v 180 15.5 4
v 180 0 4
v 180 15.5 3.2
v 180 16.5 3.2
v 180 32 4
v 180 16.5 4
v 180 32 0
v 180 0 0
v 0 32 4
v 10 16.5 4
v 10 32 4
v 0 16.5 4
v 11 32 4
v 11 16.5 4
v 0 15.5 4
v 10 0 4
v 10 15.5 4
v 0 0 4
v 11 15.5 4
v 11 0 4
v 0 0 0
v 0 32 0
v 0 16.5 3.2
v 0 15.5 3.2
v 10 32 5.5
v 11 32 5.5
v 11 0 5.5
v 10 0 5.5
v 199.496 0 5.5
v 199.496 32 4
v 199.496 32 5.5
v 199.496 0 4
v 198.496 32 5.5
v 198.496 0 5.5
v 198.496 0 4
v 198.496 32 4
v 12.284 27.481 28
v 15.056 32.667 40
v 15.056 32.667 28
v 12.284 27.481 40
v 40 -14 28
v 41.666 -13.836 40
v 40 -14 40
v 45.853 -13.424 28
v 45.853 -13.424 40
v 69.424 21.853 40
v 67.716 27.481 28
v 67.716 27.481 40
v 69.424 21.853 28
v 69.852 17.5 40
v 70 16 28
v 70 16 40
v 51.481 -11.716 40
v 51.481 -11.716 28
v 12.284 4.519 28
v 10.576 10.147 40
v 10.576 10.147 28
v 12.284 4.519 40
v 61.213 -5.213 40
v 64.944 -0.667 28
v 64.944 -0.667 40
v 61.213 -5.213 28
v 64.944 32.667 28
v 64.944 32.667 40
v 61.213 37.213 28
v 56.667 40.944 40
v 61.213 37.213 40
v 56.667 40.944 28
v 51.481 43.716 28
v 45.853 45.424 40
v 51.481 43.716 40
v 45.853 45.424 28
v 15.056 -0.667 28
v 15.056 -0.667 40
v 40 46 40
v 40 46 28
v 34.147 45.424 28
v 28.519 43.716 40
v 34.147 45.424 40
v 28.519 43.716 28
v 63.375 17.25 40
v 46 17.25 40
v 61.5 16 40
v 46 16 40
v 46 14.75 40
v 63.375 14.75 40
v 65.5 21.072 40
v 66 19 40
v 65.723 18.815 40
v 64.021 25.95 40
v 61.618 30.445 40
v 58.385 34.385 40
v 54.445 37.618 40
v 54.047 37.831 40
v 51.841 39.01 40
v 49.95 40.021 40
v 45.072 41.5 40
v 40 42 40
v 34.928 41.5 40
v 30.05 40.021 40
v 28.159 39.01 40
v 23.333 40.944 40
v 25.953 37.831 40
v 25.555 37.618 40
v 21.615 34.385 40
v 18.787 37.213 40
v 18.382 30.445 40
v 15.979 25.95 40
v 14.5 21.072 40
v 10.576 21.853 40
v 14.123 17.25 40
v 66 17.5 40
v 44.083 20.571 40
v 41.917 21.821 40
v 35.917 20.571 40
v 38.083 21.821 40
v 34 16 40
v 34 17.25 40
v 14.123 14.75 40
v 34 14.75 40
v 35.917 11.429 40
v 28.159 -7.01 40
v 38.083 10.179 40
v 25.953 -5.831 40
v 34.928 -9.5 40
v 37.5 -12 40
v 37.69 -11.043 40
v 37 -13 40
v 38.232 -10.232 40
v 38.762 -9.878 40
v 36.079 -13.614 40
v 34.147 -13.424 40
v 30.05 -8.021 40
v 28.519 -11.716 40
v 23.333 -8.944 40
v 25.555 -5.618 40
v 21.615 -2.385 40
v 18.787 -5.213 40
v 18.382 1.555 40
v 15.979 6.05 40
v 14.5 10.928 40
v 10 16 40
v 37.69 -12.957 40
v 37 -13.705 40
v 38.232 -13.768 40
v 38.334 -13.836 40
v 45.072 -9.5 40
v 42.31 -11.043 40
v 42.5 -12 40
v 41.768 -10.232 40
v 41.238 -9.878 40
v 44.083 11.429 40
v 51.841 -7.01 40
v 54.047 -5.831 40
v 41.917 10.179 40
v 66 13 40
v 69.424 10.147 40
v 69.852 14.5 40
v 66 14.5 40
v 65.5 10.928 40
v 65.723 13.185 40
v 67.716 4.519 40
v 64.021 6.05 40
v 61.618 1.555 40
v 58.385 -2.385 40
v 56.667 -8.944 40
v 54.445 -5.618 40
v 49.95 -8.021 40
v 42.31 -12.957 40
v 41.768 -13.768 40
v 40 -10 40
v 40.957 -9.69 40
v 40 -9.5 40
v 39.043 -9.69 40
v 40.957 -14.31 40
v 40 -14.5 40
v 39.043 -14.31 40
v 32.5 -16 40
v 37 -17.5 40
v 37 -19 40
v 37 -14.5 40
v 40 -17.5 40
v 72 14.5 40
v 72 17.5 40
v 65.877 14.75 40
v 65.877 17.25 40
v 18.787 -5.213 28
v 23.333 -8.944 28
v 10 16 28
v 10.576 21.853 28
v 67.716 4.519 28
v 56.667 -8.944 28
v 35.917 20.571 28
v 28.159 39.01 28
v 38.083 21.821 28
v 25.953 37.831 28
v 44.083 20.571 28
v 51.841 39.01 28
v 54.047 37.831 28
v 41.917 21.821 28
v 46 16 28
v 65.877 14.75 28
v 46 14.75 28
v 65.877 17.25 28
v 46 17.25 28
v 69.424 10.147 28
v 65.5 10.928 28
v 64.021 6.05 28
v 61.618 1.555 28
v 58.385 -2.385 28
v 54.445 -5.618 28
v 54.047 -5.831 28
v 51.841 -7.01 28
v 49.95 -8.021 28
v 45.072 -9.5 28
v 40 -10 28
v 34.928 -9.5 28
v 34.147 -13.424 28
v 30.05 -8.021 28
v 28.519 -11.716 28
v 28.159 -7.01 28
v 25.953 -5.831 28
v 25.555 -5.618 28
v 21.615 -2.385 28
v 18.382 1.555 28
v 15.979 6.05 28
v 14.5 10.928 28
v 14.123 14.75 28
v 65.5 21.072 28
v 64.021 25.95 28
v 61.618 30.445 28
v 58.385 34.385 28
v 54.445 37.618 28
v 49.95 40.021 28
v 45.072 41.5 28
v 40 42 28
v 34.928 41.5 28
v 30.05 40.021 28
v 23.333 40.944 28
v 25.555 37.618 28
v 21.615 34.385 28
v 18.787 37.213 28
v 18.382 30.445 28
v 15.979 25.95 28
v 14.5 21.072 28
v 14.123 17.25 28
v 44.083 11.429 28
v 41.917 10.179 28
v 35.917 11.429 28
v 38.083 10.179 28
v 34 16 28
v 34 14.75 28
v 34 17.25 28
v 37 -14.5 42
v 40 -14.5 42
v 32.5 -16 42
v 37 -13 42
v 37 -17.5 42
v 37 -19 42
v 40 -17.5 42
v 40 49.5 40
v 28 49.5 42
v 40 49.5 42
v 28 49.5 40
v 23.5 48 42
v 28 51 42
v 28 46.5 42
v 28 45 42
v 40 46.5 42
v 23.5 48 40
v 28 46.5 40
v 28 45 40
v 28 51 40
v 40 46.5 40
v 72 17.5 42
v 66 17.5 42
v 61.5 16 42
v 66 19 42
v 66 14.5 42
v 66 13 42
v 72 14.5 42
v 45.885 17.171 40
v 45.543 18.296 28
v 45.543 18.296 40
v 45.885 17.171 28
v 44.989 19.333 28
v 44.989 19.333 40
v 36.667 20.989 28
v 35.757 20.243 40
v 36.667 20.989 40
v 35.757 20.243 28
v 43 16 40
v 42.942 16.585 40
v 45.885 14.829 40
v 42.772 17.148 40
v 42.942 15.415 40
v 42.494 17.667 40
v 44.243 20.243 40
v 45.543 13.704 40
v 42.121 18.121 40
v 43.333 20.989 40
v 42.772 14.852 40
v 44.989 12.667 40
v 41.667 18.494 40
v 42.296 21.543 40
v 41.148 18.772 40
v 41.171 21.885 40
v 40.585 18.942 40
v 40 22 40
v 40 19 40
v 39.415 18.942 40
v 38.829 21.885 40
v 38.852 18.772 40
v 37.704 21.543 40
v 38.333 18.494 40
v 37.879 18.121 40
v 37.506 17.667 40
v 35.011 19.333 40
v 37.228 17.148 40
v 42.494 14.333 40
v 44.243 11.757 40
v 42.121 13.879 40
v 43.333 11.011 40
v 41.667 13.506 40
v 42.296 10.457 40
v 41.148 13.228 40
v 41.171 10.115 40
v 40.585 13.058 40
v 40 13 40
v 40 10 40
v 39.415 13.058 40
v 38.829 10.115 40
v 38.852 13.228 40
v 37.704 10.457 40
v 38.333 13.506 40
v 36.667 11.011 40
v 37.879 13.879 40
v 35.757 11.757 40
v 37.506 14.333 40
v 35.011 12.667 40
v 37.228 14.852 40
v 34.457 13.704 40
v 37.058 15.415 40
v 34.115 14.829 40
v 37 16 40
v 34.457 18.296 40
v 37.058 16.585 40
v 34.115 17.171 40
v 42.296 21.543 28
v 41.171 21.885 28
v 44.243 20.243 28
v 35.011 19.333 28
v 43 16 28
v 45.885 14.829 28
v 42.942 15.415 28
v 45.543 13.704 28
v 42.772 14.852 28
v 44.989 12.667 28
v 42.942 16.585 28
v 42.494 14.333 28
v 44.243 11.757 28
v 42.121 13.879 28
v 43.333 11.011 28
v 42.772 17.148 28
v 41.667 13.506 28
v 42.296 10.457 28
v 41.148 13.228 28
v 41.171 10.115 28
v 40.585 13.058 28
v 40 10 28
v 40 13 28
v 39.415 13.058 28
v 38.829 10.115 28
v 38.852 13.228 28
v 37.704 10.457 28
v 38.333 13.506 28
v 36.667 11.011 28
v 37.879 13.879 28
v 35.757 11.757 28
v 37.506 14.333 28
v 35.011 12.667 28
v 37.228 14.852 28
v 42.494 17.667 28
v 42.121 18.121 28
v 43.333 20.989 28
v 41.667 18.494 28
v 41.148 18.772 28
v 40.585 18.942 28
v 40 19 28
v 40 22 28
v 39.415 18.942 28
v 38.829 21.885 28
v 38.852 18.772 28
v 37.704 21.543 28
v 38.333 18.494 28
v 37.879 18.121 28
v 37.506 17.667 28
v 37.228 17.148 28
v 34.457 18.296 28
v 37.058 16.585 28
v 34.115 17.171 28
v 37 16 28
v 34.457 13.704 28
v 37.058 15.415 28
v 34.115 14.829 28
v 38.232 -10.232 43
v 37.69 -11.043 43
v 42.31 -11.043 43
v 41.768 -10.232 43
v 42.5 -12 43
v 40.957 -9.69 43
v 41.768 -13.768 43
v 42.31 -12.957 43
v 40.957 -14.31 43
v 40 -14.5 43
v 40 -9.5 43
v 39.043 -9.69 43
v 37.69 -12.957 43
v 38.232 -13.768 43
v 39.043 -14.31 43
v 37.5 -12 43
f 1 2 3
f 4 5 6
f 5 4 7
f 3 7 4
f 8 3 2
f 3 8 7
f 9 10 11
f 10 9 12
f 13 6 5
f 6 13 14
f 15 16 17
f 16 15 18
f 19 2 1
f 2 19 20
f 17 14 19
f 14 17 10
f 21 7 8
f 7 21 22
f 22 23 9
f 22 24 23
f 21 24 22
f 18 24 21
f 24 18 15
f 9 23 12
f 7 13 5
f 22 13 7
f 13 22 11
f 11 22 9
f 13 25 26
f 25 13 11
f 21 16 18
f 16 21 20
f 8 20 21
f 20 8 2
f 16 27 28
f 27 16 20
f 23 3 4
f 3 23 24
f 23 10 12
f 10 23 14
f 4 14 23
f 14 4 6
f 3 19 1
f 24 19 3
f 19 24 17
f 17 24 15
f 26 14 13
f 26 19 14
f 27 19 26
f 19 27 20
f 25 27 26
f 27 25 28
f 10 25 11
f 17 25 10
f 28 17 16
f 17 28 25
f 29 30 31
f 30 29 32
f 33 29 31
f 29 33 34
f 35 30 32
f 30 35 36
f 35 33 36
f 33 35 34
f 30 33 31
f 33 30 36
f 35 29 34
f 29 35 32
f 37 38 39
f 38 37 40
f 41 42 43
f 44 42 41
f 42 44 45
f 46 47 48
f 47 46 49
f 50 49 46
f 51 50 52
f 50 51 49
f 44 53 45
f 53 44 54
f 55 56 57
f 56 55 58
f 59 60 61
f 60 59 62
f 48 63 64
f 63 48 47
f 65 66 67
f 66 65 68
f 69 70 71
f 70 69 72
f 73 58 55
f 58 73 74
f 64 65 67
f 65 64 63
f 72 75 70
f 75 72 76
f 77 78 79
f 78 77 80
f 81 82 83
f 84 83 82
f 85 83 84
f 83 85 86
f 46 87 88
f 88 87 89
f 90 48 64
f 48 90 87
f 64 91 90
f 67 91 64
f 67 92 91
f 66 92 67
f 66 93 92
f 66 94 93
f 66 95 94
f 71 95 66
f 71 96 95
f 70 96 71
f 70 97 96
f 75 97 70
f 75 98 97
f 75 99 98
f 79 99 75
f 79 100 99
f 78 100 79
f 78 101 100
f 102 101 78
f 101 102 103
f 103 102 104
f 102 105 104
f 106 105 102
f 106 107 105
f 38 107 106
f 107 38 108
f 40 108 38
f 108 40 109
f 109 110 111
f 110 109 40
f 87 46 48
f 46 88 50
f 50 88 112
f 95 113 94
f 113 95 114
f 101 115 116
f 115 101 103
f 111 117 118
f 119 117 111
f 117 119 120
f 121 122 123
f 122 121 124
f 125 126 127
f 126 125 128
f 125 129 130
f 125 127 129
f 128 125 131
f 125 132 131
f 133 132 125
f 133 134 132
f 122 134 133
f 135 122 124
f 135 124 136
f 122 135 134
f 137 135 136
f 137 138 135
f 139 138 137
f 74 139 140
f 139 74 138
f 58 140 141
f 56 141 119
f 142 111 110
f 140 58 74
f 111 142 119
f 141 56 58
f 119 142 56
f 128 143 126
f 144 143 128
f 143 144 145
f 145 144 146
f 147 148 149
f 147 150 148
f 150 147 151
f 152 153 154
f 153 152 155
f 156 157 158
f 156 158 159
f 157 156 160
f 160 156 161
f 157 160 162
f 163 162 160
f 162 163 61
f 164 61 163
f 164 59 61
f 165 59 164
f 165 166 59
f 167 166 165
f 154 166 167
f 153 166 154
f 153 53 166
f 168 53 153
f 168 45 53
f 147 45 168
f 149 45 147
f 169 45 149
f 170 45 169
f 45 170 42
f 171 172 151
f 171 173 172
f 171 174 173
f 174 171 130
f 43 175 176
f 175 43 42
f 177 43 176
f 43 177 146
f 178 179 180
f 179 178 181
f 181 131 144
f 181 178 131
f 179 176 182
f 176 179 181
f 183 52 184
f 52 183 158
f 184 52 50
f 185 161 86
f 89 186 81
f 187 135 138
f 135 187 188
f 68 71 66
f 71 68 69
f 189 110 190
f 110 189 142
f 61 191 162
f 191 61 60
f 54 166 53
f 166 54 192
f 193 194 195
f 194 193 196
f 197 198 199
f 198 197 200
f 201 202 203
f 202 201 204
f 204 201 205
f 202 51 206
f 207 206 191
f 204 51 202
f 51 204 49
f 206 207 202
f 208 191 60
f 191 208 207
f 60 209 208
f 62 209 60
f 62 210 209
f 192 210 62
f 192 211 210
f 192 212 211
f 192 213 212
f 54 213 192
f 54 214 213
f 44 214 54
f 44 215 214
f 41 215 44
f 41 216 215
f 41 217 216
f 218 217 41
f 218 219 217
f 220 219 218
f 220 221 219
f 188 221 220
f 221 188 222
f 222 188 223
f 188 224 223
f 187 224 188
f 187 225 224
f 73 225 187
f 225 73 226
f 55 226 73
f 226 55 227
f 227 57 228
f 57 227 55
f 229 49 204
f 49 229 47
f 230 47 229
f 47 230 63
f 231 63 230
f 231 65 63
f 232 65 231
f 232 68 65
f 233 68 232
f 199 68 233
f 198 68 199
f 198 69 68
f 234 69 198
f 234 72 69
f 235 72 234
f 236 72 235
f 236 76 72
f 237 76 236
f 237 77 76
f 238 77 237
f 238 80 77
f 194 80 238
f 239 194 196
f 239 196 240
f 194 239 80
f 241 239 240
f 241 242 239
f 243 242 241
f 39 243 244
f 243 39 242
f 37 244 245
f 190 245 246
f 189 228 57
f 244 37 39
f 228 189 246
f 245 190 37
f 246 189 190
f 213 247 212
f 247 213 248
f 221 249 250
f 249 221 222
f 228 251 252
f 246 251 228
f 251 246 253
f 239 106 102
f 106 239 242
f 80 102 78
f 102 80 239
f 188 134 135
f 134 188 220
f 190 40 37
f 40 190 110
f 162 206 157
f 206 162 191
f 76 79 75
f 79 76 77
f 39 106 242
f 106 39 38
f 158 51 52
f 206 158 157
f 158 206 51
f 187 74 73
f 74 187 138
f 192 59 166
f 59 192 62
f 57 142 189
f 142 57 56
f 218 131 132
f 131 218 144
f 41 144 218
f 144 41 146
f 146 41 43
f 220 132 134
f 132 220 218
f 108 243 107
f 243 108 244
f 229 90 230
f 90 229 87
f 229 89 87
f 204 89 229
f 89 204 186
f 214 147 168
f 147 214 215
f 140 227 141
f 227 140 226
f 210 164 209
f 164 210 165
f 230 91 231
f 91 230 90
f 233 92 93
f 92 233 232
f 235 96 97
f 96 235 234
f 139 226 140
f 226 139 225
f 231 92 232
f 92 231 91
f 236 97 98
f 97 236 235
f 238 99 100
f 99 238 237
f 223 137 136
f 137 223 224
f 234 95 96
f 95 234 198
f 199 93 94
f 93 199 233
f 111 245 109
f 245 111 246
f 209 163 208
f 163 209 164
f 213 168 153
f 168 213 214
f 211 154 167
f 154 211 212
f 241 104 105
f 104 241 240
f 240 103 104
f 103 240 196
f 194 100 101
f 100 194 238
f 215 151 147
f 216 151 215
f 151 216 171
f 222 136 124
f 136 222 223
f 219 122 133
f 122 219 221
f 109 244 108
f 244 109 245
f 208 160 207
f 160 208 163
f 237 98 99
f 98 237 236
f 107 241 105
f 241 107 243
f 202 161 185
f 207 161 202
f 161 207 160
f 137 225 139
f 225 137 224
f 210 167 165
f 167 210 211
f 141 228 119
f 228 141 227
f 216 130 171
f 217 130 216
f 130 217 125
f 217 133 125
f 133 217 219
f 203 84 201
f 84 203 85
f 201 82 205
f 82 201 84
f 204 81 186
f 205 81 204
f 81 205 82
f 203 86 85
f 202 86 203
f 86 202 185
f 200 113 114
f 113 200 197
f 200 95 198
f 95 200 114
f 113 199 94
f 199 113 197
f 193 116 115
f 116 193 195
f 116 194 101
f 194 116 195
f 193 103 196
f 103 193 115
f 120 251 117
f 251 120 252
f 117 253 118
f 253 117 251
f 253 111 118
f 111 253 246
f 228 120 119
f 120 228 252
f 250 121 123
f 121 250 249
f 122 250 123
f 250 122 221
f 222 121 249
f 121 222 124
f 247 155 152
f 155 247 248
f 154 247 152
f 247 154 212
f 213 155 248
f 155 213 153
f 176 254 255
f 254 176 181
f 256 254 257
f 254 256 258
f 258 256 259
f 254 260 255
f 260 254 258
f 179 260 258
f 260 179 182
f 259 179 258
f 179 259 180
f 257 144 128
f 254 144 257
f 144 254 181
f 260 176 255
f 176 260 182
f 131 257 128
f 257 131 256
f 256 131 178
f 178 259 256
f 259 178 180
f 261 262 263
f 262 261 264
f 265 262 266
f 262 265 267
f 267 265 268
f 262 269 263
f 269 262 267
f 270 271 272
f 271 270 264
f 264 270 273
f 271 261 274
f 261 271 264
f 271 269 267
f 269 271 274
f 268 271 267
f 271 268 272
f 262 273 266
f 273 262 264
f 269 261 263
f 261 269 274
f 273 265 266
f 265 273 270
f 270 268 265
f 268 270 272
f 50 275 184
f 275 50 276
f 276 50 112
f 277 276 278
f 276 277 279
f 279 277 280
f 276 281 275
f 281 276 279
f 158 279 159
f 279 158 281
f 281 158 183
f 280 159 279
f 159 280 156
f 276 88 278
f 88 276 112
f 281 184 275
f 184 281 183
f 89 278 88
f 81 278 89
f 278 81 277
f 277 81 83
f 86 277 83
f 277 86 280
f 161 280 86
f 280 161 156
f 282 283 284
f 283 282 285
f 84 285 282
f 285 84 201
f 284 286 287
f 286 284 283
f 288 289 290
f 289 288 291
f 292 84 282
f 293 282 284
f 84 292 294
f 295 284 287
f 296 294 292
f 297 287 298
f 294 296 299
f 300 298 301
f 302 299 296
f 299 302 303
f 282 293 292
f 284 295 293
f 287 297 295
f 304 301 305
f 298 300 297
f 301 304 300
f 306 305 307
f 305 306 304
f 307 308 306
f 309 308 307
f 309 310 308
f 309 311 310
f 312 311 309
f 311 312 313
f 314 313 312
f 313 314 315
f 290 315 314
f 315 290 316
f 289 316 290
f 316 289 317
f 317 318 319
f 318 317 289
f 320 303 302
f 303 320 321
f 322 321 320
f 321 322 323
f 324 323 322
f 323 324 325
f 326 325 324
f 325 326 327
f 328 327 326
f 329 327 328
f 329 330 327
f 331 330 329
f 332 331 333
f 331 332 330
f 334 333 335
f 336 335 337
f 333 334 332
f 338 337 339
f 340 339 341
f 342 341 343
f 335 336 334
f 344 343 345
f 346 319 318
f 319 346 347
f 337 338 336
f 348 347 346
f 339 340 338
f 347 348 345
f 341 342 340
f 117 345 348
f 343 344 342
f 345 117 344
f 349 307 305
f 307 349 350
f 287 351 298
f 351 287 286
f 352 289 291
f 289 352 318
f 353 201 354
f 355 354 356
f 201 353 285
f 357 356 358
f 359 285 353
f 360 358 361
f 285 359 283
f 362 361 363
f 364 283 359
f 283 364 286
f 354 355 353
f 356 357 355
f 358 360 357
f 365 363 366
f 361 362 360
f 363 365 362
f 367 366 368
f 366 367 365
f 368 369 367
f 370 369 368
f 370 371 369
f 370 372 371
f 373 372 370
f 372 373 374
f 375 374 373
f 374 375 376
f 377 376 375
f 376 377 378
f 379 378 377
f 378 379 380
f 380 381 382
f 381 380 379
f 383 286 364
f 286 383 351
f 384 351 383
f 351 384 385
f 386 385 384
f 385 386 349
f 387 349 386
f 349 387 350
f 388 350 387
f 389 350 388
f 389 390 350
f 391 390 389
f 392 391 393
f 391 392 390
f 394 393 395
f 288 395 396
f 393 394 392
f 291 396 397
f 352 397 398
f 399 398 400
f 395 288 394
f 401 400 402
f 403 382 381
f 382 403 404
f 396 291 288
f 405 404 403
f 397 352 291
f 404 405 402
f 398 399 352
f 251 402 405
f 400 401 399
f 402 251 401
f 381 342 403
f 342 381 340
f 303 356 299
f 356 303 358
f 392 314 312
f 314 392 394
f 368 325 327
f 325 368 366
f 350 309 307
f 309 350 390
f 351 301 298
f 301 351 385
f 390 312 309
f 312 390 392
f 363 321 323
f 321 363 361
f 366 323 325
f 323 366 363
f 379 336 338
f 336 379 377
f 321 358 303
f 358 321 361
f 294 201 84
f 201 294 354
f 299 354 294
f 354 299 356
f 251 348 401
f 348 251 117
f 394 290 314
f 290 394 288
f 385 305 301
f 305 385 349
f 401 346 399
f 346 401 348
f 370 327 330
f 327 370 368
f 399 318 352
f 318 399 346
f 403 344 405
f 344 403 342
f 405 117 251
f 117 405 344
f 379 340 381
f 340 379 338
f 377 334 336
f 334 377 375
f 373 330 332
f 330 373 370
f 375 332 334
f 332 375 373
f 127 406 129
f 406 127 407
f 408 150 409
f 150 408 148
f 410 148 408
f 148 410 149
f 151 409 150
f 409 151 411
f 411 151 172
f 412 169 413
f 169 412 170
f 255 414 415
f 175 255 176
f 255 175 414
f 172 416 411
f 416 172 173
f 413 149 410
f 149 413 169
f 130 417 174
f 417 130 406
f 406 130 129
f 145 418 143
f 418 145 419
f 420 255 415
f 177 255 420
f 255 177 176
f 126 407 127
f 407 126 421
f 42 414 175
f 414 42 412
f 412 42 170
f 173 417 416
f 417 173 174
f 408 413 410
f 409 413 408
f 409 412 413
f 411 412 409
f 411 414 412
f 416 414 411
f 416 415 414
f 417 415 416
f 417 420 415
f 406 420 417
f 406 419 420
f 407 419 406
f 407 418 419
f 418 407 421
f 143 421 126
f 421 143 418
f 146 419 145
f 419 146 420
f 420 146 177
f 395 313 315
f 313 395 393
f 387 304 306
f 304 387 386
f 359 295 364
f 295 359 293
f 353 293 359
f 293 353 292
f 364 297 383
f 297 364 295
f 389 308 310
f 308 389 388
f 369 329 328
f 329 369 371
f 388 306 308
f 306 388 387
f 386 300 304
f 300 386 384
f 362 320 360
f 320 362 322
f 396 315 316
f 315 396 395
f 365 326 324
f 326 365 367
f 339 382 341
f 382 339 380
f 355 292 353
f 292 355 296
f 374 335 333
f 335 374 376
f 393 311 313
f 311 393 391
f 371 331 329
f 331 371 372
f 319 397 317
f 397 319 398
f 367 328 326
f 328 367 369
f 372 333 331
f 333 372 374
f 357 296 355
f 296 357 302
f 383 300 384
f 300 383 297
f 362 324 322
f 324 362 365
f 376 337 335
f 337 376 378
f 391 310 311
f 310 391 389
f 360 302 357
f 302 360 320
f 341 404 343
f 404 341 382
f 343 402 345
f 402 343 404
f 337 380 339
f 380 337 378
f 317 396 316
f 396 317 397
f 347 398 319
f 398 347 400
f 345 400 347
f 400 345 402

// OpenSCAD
/*
 * Title: Rolling Wheel Set
 * Folder: 13_rolling_motion
 * Physics Topic: Rolling Without Slipping, Cycloid Motion, Rolling Kinematics
 * Difficulty: Intermediate
 * Print Type: flat/freestanding
 * Teaches: v_contact=0, v_top=2v, cycloid rim path, rolling kinematics v=ωR
 * Use Case: Place wheel on surface, roll one revolution, observe contact point and velocity arrows
 */

// --------------------
// Parameters
// --------------------
wheel_diameter          = 60;   // mm — main wheel outer diameter
wheel_thickness         = 12;   // mm — wheel depth (axle direction)
hub_diameter            = 12;   // mm — central hub diameter
spoke_count             = 6;    // number of spokes
show_contact_mark       = true; // raised notch at rim showing instantaneous contact point
show_velocity_arrows    = true; // arrows: v=0 at bottom, v=2v at top
rolling_surface_width   = 180;  // mm — length of the flat rolling surface board
rolling_surface_thickness = 4;  // mm — thickness of rolling surface board

// --------------------
// Physics Meaning
// --------------------
// Rolling without slipping means the contact point velocity is zero.
// v_contact = v_cm - ω·R = 0  →  v_cm = ω·R
// The top of the wheel moves at v_top = v_cm + ω·R = 2·v_cm
// A point on the rim traces a CYCLOID as the wheel rolls.
// One full revolution moves the center by exactly 2π·R = π·d.

// --------------------
// Learning Notes
// --------------------
// - Spokes make rotation visually obvious when rolling
// - The rim notch (contact mark) shows the cycloid tracing point
// - Solid disk, spoked wheel, and ring have same mass but different moments of inertia
// - I_solid = (1/2)mR²,  I_ring = mR²,  I_spoked ≈ between these two

// --------------------
// Print Notes
// --------------------
// - Print wheel flat (face down); spokes bridge cleanly at 0.2 mm layers
// - Rolling surface prints flat; no supports needed
// - Use 20% infill for the wheel body
// - Increase $fn for smoother wheels if needed

// --------------------
// Customization Ideas
// --------------------
// - Change spoke_count to 3 for dramatic look or 12 for fine detail
// - Adjust wheel_diameter and update rolling_surface_width to match new πd
// - Add a second notch 180° from the first to show two cycloid points simultaneously

$fn = 32;

wheel_radius   = wheel_diameter / 2;
spoke_width    = 2.5;   // mm
spoke_height   = wheel_thickness;
rim_thickness  = 4;     // mm
arrow_height   = 2;     // mm raised above wheel face
arrow_width    = 3;     // mm
arrow_length   = 12;    // mm base arrow length

// --------------------
// Wheel rim helper
// --------------------
module wheel_rim() {
  difference() {
    cylinder(h=wheel_thickness, d=wheel_diameter, center=true);
    cylinder(h=wheel_thickness + 1, d=wheel_diameter - 2*rim_thickness, center=true);
  }
}

// --------------------
// Hub
// --------------------
module wheel_hub() {
  cylinder(h=wheel_thickness, d=hub_diameter, center=true);
}

// --------------------
// Single spoke
// --------------------
module spoke() {
  spoke_len = wheel_radius - hub_diameter/2 - rim_thickness;
  translate([hub_diameter/2, -spoke_width/2, -wheel_thickness/2])
    cube([spoke_len, spoke_width, wheel_thickness]);
}

// --------------------
// Contact point mark (notch on rim)
// --------------------
module contact_mark() {
  // Raised rectangular tab on rim at bottom (θ = -90°, i.e. contact point position)
  translate([0, -wheel_radius + rim_thickness/2, wheel_thickness/2])
    cylinder(h=3, d=5, $fn=16);
}

// --------------------
// Velocity arrow (simple raised wedge)
// --------------------
module velocity_arrow(length, label_side=1) {
  // Shaft
  translate([-arrow_width/2, 0, 0])
    cube([arrow_width, length, arrow_height]);
  // Head
  translate([0, length, 0])
    linear_extrude(height=arrow_height)
      polygon([[0, 0], [-arrow_width, 0], [0, arrow_width*1.5], [arrow_width, 0]]);
}

// --------------------
// rolling_wheel() — main spoked wheel
// --------------------
module rolling_wheel() {
  difference() {
    union() {
      wheel_rim();
      wheel_hub();
      for (i = [0 : spoke_count - 1]) {
        rotate([0, 0, i * 360 / spoke_count])
          spoke();
      }
      if (show_contact_mark) {
        contact_mark();
      }
      if (show_velocity_arrows) {
        // v=0 arrow at contact point (bottom) — tiny stub
        translate([0, -wheel_radius - 2, wheel_thickness/2])
          rotate([0, 0, 90])
            velocity_arrow(3);
        // v=2v arrow at top — full length arrow pointing forward
        translate([0, wheel_radius + 2, wheel_thickness/2])
          rotate([0, 0, 90])
            velocity_arrow(arrow_length);
        // v=v arrow at center — medium arrow
        translate([wheel_radius + 2, 0, wheel_thickness/2])
          rotate([0, 0, 90])
            velocity_arrow(arrow_length / 2);
      }
    }
    // Axle hole through center
    cylinder(h=wheel_thickness + 2, d=6, center=true);
  }
}

// --------------------
// solid_rolling_disk() — no spokes, for moment of inertia comparison
// --------------------
module solid_rolling_disk() {
  difference() {
    cylinder(h=wheel_thickness, d=wheel_diameter, center=true);
    cylinder(h=wheel_thickness + 2, d=6, center=true);
  }
}

// --------------------
// ring_wheel() — rim only, no spokes
// --------------------
module ring_wheel() {
  difference() {
    cylinder(h=wheel_thickness, d=wheel_diameter, center=true);
    cylinder(h=wheel_thickness + 2, d=wheel_diameter - 2*rim_thickness, center=true);
    cylinder(h=wheel_thickness + 2, d=6, center=true);
  }
}

// --------------------
// rolling_surface() — flat board with tick marks
// --------------------
module rolling_surface() {
  circumference = PI * wheel_diameter;
  tick_spacing  = circumference;   // one full revolution
  tick_height   = 1.5;
  tick_width    = 1;
  tick_depth    = rolling_surface_thickness + tick_height;

  difference() {
    // Base board
    cube([rolling_surface_width, wheel_thickness + 20, rolling_surface_thickness]);
    // Center groove line
    translate([0, (wheel_thickness + 20)/2 - 0.5, rolling_surface_thickness - 0.8])
      cube([rolling_surface_width, 1, 1]);
  }
  // Origin tick
  translate([10, 0, rolling_surface_thickness])
    cube([tick_width, wheel_thickness + 20, tick_height]);
  // One-revolution tick at πd from origin
  translate([10 + circumference, 0, rolling_surface_thickness])
    cube([tick_width, wheel_thickness + 20, tick_height]);
}

// --------------------
// wheel_and_surface() — combined display
// --------------------
module wheel_and_surface() {
  rolling_surface();
  translate([10 + wheel_radius, (wheel_thickness + 20)/2, rolling_surface_thickness + wheel_radius])
    rolling_wheel();
}

// --------------------
// demo_default()
// --------------------
module demo_default() {
  wheel_and_surface();
}

// --------------------
// demo_comparison() — solid, spoked, ring side by side
// --------------------
module demo_comparison() {
  spacing = wheel_diameter + 20;

  translate([0, 0, 0])       solid_rolling_disk();
  translate([spacing, 0, 0]) rolling_wheel();
  translate([spacing*2, 0, 0]) ring_wheel();
}

// Run default demo
demo_default();
